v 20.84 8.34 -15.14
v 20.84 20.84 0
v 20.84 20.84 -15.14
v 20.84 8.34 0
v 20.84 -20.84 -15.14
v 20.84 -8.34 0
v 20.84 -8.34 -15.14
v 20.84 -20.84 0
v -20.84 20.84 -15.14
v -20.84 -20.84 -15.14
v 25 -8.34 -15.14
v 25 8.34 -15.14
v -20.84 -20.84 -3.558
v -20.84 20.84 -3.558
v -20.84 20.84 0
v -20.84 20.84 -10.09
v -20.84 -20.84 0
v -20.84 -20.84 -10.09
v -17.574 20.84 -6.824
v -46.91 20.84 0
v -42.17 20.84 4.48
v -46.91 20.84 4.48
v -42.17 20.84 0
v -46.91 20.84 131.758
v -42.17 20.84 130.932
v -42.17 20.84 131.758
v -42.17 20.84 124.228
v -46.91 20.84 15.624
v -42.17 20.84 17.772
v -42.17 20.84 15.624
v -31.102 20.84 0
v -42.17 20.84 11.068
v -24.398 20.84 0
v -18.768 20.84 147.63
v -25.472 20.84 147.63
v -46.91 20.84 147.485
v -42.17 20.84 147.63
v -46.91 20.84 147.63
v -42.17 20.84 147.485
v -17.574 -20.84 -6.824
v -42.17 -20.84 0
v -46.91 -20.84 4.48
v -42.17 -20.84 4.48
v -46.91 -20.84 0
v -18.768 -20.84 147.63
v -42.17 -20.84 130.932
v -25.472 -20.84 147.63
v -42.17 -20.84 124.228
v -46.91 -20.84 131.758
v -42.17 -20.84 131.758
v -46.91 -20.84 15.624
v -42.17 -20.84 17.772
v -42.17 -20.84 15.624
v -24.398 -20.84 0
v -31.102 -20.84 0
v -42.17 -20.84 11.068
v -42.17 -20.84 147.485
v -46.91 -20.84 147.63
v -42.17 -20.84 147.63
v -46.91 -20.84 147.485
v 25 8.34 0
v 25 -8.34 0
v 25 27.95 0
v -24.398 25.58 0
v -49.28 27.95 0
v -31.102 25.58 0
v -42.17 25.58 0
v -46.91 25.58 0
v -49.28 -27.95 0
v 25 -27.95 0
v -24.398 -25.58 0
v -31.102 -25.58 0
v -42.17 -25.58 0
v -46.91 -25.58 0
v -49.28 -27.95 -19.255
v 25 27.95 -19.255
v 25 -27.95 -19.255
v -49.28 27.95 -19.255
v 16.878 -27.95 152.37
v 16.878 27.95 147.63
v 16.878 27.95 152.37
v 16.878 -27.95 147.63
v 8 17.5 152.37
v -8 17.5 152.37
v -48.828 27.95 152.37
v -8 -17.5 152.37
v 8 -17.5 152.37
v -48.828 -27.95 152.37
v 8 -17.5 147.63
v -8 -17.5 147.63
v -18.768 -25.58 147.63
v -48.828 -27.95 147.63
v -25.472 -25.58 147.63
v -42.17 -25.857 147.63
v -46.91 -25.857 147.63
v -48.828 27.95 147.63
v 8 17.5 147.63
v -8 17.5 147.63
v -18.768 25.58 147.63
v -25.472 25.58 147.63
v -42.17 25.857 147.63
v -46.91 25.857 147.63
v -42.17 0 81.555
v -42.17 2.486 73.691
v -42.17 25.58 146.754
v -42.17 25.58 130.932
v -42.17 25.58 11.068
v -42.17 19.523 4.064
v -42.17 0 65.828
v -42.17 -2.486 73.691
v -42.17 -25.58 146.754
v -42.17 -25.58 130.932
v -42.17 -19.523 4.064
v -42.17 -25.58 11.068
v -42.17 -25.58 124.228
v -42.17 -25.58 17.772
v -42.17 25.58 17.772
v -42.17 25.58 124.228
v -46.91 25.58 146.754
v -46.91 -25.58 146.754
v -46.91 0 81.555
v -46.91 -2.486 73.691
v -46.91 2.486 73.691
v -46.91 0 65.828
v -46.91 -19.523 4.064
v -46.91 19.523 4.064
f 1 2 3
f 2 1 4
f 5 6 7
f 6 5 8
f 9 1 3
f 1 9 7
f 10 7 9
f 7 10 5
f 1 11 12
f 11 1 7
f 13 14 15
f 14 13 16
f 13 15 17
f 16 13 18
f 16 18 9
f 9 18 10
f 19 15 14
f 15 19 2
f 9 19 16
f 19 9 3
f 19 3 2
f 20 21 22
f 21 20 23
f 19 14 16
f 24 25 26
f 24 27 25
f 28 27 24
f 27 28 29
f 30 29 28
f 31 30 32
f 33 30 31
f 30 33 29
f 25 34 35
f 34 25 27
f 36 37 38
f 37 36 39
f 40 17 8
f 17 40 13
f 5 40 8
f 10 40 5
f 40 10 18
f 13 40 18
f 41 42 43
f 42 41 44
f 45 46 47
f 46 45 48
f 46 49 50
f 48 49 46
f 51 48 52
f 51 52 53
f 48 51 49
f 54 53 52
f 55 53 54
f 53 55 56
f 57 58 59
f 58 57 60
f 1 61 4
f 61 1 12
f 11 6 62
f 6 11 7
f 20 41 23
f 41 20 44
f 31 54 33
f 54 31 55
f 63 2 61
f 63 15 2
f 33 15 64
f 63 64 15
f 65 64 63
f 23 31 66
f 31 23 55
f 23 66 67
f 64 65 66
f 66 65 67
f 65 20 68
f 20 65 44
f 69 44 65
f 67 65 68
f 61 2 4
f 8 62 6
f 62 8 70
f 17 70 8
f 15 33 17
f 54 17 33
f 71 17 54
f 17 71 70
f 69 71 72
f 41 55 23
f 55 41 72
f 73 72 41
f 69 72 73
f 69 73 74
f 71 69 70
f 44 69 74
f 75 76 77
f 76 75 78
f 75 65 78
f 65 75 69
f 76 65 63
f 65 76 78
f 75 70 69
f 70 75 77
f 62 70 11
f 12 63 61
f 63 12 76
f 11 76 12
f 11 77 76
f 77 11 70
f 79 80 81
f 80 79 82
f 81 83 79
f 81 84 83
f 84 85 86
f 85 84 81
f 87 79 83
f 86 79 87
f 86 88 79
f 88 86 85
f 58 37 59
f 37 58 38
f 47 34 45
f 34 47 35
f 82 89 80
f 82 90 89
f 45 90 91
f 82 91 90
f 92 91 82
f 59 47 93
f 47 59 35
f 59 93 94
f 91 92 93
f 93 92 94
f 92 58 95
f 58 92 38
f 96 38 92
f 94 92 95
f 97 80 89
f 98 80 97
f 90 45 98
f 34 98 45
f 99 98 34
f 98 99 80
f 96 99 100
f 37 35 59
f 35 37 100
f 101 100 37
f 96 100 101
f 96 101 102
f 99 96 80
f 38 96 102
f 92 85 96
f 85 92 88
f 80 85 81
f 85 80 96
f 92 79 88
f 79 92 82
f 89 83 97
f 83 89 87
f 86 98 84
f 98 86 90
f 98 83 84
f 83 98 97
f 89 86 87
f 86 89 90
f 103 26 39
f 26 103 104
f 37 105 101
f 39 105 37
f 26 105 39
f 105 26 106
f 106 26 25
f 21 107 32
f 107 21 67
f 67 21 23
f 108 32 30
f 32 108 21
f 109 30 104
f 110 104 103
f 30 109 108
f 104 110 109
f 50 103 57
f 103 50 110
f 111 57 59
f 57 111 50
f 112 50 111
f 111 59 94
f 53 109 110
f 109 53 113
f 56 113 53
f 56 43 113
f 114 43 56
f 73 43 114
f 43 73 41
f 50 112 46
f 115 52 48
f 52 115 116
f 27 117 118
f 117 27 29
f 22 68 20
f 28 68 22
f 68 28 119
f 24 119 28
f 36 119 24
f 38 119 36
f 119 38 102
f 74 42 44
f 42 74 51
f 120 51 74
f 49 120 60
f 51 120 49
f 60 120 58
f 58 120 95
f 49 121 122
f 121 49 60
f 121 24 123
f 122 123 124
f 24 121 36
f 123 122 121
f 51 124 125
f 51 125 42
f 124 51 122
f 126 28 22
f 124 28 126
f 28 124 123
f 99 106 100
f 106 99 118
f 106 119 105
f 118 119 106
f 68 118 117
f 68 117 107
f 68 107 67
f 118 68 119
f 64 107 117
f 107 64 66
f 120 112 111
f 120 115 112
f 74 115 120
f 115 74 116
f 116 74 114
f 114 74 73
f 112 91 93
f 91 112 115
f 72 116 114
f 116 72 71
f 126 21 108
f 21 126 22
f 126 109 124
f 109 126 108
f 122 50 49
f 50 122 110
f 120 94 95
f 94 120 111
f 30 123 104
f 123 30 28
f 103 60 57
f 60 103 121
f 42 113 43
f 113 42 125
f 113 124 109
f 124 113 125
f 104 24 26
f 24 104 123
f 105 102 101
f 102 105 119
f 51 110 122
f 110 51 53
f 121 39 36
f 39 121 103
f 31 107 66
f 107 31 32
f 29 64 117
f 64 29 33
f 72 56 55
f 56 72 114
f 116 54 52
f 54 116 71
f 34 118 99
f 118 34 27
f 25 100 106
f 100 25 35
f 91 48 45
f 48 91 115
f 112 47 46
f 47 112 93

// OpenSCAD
// Lidar spinner

$fa = 5;
$fs = 0.3;

//stepper dimensions
clearance = 0.14;
stepperHeight = 20 + clearance;
stepperWidth = 40 + 12 * clearance;

stepperRodHeight = 25 + clearance;
stepperRodDiamter = 5 + clearance;


stepperCableWidth = 15 + 12 *clearance;
stepperCableHeight = stepperHeight;
stepperCableDepth = 100 + 4* clearance;  // can exagerate to leave larger cutout 

module stepper(){
    union(){
        
        // Stepper Base
        translate([0, 0, -stepperHeight/2]){
            cube([stepperWidth, stepperWidth, stepperHeight], center = true);
        } 
        
        // Stepper Rod
        translate([0,0,stepperRodHeight/2]){
            difference(){
                cylinder(h = stepperRodHeight, r = stepperRodDiamter/2, center = true);
                translate([-3.5,0,0.1]){
                    cube([3, 3, stepperRodHeight], center=true);
                } 
        } 
    }
        // Stepper Cabling
        translate([stepperWidth/2+ stepperCableDepth/2,0,stepperCableHeight/2-stepperHeight]){
            cube([stepperCableDepth,stepperCableWidth, stepperCableHeight], center = true);
        } 
    }
} 

// dimensions for lidar base 

baseThickness = 4.74 * 3; // should be exactly 24 lines
baseHeight = stepperHeight/4 + baseThickness;
baseWidth = stepperWidth + baseThickness; 
baseDepth = stepperWidth + 4 * baseThickness; 



module base(){
    difference(){ 
        translate([0,0,-baseHeight/2]){
            cube([baseDepth,baseWidth,baseHeight], center = true);
        } 
        translate([0,0,5])
        {
            stepper();
        }
        translate([50,,0])
        {
            cube([50,100,50],center = true);
        }
        
    } 
} 


//dimensions for mirror stand
mirrorWidth = 2*25.4;
mirrorHeight = 1; 

module mirror(){
    translate([0,0,stepperRodHeight + stepperRodDiamter]){
        rotate([0,45,0]){
            cube([mirrorWidth, mirrorWidth, mirrorHeight], center = true);
        } 
    } 
} 

module mirrorStand(){
    difference(){
        translate([0,0,stepperRodHeight + stepperRodDiamter ]){
            difference(){
                cube([mirrorWidth*0.9, mirrorWidth, mirrorWidth* 0.9], center = true);
                rotate([0,45,0]){
                    translate([0,0,mirrorWidth/2]){
                        cube([mirrorWidth*2, mirrorWidth*2, mirrorWidth], center = true);   
                    } 
                }
                rotate([0,45,0]){
                    translate([0,0,-0.95*mirrorWidth]){
                        cube([mirrorWidth*2, mirrorWidth*2, mirrorWidth], center = true);   
                    } 
                }
            } 
        }
       stepper(); 
    }
} 

//dimensions for sensor stand
standHeight = 150;
standWidth = 4.74; 
roofWidth = baseWidth;
roofDepth = baseDepth;
pillarYOffset = baseWidth/2 - standWidth;
diagonalHeight = sqrt(standHeight * standHeight+(2*pillarYOffset)*(2*pillarYOffset))-3;
supportAngle= asin((2 * pillarYOffset)/diagonalHeight);



module sensorStand(){
    union(){
        // vertical supports
        translate([-(baseDepth/2 - standWidth),pillarYOffset,standHeight/2]){
            cube([standWidth,standWidth,standHeight], center = true);
        } 
        translate([-(baseDepth/2 - standWidth),-(pillarYOffset),standHeight/2]){
            cube([standWidth,standWidth,standHeight], center = true);
        } 
        
        // roof
        difference(){
            translate([-( roofWidth/4)-2,0, standHeight])
            {
                cube([roofDepth*2/3,roofWidth,4.74], center = true);
            } 
            translate([0,0,150])
            {
                cube([16,35,50],center = true);
            }
        }
       
        // long diagonal supports
        rotate([supportAngle,0,0]){
            translate([-(baseDepth/2 - standWidth),pillarYOffset-1,standHeight/2]){
                cube([standWidth,standWidth,diagonalHeight], center = true);
            }
        }
        rotate([-supportAngle,0,0]){
            translate([-(baseDepth/2 - standWidth),-pillarYOffset+1,standHeight/2]){
                cube([standWidth,standWidth,diagonalHeight], center = true);
            }
        }
        // short diagonal supports bottom
        translate([-(baseDepth/2 + baseThickness)/2,pillarYOffset,4]){
            rotate([0,-45,0]){
                cube([standWidth,standWidth,sqrt(25*25+25*25)],center = true);
                
            }
        } 
        translate([-(baseDepth/2 + baseThickness)/2,-pillarYOffset,4]){
            rotate([0,-45,0]){
                cube([standWidth,standWidth,sqrt(25*25+25*25)],center = true);
                
            }
        } 
        
        // short diagonal supports top
        translate([-(baseDepth/2 + baseThickness)/2,pillarYOffset,138]){
            rotate([0,45,0]){
                cube([standWidth,standWidth,sqrt(25*25+25*25)],center = true);
                
            }
        } 
        translate([-(baseDepth/2 + baseThickness)/2,-pillarYOffset,138]){
            rotate([0,45,0]){
                cube([standWidth,standWidth,sqrt(25*25+25*25)],center = true);
                
            }
        } 
    }
} 
module fullThing() {
    union()
    { 
        color("blue") base();
        color("blue") sensorStand();
    }
}  
//color ("red", 0.5) mirror();
translate([0,0,5])
{
//color ("red", 0.5) stepper();
}
rotate([0,0,0])
{
//color("blue") mirrorStand();
}
color("blue") fullThing();
